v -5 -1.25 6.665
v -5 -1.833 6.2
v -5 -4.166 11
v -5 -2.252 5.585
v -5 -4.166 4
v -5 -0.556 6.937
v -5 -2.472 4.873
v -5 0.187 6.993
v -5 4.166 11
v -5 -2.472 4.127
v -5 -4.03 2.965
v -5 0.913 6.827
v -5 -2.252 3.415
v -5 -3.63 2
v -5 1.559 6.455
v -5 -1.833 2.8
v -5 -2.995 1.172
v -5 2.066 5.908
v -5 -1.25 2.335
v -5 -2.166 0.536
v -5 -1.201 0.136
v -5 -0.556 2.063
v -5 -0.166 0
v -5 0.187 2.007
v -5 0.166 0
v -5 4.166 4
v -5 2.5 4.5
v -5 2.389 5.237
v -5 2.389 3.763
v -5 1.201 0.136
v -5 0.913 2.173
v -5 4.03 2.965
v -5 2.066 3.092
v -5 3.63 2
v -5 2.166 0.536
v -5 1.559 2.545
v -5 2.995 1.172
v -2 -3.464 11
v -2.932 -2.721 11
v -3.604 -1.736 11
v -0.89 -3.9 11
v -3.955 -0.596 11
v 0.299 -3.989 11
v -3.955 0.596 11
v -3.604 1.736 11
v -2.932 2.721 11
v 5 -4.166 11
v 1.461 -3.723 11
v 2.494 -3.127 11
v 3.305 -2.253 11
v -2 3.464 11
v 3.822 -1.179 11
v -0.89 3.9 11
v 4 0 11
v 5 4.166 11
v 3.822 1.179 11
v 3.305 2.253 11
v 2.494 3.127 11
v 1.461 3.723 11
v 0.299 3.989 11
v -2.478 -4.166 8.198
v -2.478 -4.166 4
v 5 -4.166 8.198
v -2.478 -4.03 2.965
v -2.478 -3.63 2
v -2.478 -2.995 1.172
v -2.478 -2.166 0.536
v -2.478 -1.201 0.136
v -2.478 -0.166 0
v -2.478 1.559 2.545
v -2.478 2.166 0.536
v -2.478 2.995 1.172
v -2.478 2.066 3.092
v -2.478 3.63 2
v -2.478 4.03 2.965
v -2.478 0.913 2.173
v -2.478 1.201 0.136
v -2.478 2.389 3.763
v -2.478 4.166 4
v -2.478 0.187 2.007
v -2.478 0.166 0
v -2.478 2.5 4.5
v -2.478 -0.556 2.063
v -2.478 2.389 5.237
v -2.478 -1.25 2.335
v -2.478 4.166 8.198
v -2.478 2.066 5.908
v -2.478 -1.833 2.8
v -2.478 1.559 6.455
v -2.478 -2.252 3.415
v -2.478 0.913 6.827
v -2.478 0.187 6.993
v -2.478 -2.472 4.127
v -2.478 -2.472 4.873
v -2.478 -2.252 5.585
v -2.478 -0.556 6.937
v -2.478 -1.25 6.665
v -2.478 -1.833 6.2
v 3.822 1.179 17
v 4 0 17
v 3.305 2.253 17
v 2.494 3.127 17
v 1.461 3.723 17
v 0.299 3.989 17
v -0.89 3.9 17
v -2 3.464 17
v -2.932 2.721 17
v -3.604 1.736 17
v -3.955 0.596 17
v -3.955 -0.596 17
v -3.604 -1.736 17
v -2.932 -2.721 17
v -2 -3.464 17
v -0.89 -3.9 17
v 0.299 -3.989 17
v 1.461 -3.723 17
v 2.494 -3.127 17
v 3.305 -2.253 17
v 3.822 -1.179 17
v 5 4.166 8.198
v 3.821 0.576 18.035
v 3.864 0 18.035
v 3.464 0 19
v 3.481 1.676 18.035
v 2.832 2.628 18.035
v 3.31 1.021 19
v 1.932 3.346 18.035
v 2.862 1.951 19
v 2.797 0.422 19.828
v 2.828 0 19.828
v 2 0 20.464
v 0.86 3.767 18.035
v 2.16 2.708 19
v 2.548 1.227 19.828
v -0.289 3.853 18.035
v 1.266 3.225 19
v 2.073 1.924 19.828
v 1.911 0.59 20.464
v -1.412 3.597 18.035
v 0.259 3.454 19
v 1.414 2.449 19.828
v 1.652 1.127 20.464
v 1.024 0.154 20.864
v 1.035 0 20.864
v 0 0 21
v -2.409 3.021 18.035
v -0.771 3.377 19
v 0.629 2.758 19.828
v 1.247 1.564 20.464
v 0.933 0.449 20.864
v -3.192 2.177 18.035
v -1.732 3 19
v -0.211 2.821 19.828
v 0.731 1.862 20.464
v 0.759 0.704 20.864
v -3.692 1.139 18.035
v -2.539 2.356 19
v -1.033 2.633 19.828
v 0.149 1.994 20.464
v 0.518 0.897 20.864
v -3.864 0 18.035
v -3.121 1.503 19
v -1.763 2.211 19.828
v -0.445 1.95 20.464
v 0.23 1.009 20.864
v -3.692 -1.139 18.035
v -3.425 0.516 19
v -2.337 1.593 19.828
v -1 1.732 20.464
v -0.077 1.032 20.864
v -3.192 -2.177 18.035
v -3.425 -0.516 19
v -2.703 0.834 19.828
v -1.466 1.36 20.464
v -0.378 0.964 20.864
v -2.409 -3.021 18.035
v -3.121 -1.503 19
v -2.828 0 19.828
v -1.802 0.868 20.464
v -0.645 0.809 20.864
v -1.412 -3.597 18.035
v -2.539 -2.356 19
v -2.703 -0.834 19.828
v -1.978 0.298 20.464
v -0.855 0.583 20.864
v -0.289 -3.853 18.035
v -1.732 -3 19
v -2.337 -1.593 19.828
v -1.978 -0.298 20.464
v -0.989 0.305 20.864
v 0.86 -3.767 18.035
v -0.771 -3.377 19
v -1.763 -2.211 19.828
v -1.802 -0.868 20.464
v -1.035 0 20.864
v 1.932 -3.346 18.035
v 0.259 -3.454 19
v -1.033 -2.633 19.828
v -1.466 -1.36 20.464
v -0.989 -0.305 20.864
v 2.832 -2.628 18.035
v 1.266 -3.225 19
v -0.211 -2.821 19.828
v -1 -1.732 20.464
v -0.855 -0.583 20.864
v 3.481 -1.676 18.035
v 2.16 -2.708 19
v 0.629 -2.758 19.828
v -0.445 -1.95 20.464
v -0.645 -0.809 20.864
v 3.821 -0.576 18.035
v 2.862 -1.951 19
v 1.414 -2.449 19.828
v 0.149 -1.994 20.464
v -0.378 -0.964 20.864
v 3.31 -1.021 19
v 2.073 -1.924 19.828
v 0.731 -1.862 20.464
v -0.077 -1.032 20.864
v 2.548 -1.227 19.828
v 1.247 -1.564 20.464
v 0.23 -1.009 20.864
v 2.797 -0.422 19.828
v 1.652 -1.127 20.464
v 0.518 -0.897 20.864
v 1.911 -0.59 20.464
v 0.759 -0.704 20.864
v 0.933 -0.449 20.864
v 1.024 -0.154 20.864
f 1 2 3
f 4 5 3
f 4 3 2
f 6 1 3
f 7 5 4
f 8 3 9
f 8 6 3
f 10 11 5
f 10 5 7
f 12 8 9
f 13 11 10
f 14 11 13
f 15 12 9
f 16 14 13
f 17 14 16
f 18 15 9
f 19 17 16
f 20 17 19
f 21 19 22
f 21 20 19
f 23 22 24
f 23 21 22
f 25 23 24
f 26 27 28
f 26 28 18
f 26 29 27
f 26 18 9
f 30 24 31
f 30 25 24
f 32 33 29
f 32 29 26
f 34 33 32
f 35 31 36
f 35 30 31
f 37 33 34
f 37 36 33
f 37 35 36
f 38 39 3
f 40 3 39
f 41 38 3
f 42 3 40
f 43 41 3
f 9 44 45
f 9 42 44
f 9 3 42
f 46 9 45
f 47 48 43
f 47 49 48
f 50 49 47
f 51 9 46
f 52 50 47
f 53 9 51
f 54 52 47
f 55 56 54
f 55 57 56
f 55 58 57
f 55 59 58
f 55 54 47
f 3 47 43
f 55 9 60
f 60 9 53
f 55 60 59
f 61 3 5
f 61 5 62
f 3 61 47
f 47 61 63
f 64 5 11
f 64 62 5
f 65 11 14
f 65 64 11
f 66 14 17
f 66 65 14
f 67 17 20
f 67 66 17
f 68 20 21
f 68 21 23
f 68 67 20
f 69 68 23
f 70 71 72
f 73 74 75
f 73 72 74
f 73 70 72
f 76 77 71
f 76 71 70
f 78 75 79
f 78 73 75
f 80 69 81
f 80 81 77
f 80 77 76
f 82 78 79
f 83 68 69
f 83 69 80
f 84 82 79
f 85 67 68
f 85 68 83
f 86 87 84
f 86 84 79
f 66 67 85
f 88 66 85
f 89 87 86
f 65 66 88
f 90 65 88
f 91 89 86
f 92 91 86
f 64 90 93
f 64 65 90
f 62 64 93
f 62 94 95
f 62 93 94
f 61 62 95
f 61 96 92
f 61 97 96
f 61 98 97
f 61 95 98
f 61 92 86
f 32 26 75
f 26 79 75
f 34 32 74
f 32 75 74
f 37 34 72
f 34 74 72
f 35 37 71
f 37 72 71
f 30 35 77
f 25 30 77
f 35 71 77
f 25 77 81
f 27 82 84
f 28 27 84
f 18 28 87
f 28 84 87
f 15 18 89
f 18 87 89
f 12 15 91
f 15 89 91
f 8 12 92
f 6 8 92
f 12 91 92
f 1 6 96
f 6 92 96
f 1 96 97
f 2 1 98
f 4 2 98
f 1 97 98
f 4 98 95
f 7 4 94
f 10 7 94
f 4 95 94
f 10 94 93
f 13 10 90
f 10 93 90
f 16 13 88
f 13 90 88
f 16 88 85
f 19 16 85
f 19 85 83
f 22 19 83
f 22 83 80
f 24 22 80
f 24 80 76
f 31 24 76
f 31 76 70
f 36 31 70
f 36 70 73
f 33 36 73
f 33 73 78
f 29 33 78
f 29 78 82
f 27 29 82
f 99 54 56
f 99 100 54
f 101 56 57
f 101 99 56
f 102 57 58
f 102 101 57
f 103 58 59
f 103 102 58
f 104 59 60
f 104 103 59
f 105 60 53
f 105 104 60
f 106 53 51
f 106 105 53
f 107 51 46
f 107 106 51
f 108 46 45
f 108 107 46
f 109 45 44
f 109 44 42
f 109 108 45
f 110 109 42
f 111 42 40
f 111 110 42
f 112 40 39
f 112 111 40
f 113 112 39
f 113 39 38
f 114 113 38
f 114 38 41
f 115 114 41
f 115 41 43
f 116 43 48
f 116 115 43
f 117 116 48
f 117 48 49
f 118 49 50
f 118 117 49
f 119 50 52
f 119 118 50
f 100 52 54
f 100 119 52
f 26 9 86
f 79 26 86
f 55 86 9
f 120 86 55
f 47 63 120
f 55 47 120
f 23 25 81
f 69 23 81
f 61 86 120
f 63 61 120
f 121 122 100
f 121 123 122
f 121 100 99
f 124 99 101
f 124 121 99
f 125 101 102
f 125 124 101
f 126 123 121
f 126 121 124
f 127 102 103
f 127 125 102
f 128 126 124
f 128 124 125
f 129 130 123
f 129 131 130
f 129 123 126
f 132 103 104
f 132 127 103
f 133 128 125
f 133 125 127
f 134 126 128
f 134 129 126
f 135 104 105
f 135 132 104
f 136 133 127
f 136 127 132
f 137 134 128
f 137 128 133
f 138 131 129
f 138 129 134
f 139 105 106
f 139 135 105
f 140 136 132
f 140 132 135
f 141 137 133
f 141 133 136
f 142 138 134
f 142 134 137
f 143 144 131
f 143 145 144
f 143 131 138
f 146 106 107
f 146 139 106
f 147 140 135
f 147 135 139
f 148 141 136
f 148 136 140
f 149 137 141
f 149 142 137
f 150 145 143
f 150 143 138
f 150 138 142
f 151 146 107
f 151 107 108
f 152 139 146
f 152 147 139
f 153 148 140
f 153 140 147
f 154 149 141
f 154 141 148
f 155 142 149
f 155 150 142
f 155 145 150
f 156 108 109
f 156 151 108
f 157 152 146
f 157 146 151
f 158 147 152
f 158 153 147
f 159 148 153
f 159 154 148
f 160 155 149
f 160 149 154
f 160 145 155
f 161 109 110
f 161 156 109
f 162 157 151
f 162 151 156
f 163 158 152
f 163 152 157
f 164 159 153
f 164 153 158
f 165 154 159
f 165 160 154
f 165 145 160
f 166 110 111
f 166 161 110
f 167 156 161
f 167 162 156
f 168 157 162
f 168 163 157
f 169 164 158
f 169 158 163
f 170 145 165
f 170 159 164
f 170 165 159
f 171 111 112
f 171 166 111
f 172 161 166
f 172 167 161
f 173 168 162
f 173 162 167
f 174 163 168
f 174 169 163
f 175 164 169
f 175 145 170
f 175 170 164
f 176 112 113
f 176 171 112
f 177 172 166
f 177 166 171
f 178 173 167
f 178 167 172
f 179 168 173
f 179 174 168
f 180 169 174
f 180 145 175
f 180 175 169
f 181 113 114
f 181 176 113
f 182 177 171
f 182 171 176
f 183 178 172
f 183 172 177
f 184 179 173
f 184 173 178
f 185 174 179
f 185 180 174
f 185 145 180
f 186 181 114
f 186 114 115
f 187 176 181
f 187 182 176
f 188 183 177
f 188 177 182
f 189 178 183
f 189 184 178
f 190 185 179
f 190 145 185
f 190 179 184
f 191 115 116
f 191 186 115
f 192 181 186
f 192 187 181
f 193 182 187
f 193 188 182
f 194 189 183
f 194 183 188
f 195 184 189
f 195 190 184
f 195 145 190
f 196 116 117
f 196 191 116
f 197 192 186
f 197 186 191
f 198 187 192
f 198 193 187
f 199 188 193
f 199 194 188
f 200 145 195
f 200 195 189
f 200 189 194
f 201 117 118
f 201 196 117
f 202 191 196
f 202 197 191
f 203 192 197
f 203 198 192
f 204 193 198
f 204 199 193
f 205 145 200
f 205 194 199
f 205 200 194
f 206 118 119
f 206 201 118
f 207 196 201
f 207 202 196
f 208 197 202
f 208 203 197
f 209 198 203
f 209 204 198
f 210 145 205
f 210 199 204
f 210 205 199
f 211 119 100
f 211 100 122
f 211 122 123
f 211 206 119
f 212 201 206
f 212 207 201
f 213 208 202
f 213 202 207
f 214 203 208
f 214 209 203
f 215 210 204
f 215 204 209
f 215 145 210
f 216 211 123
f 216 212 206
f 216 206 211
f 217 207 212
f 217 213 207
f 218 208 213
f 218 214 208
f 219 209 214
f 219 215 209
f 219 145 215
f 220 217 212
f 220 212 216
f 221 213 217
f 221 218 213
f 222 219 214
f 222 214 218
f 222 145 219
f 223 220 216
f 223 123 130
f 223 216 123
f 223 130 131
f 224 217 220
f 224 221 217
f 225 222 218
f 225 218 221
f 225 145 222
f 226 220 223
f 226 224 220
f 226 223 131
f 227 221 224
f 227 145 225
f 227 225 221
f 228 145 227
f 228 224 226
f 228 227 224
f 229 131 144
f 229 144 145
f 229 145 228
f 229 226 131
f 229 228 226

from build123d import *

# Parameters (mm, degrees)
F0_W      = 254
F0_H      = 254
F0_W_2    = 19.9865185836
F0_H_2    = 80.453767086
F1_DEPTH  = 1
F2_W      = 10
F2_H      = 8.3321671046
F3_DEPTH  = 16
F4_W      = 10
F4_H      = 8.3321671046
F4_R      = 4
F5_DEPTH  = 5
F6_W      = 7.4782028049
F6_H      = 8.1982985139
F7_DEPTH  = 11
F8_DEPTH  = 5
F11_R     = 4
F12_R     = 4
F9_R      = 2.5
F13_DEPTH = 5


with BuildPart() as f1:
    # F0 (on Front) → F1 (new body)
    with BuildSketch(Plane.XZ):
        with Locations((193.7753074374, -446.9196461141)):
            Rectangle(F0_W, F0_H)
        with Locations((130.3308923814, -466.3652455825)):
            Rectangle(F0_W_2, F0_H_2, mode=Mode.SUBTRACT)
    extrude(amount=F1_DEPTH)


with BuildPart() as f3:
    # F2 (on Top) → F3 (new body)
    with BuildSketch(Plane.XY):
        Rectangle(F2_W, F2_H)
    extrude(amount=F3_DEPTH)

    # F4 (on face) → F5 (cut)
    with BuildSketch(Plane.XY.offset(16)):
        Rectangle(F4_W, F4_H)
        Circle(F4_R, mode=Mode.SUBTRACT)
    extrude(amount=-F5_DEPTH, mode=Mode.SUBTRACT)

    # F6 (on face) → F7 (cut)
    with BuildSketch(Plane.XZ.offset(4.1660835523)):
        with Locations((1.2608985975, 4.0991492569)):
            Rectangle(F6_W, F6_H)
    extrude(amount=-F7_DEPTH, mode=Mode.SUBTRACT)

    # F8 (add): a face of the model
    f8_faces = [f3.faces().sort_by_distance(p)[0] for p in [
        (0, 0, 16),
    ]]
    extrude(f8_faces, amount=F8_DEPTH)

    # F11
    f11_edges = [f3.edges().sort_by_distance(p)[0] for p in [
        (-4, 0, 21),
    ]]
    fillet(f11_edges, radius=F11_R)

    # F12
    f12_edges = [f3.edges().sort_by_distance(p)[0] for p in [
        (-3.739101, -4.166084, 0),
        (-3.739101, 4.166084, 0),
    ]]
    fillet(f12_edges, radius=F12_R)

    # F9 (on face) → F13 (cut)
    with BuildSketch(Plane.YZ.offset(-2.4782028049)):
        with Locations((0, 4.5)):
            Circle(F9_R)
    extrude(amount=-F13_DEPTH, mode=Mode.SUBTRACT)


solid = f3.part
